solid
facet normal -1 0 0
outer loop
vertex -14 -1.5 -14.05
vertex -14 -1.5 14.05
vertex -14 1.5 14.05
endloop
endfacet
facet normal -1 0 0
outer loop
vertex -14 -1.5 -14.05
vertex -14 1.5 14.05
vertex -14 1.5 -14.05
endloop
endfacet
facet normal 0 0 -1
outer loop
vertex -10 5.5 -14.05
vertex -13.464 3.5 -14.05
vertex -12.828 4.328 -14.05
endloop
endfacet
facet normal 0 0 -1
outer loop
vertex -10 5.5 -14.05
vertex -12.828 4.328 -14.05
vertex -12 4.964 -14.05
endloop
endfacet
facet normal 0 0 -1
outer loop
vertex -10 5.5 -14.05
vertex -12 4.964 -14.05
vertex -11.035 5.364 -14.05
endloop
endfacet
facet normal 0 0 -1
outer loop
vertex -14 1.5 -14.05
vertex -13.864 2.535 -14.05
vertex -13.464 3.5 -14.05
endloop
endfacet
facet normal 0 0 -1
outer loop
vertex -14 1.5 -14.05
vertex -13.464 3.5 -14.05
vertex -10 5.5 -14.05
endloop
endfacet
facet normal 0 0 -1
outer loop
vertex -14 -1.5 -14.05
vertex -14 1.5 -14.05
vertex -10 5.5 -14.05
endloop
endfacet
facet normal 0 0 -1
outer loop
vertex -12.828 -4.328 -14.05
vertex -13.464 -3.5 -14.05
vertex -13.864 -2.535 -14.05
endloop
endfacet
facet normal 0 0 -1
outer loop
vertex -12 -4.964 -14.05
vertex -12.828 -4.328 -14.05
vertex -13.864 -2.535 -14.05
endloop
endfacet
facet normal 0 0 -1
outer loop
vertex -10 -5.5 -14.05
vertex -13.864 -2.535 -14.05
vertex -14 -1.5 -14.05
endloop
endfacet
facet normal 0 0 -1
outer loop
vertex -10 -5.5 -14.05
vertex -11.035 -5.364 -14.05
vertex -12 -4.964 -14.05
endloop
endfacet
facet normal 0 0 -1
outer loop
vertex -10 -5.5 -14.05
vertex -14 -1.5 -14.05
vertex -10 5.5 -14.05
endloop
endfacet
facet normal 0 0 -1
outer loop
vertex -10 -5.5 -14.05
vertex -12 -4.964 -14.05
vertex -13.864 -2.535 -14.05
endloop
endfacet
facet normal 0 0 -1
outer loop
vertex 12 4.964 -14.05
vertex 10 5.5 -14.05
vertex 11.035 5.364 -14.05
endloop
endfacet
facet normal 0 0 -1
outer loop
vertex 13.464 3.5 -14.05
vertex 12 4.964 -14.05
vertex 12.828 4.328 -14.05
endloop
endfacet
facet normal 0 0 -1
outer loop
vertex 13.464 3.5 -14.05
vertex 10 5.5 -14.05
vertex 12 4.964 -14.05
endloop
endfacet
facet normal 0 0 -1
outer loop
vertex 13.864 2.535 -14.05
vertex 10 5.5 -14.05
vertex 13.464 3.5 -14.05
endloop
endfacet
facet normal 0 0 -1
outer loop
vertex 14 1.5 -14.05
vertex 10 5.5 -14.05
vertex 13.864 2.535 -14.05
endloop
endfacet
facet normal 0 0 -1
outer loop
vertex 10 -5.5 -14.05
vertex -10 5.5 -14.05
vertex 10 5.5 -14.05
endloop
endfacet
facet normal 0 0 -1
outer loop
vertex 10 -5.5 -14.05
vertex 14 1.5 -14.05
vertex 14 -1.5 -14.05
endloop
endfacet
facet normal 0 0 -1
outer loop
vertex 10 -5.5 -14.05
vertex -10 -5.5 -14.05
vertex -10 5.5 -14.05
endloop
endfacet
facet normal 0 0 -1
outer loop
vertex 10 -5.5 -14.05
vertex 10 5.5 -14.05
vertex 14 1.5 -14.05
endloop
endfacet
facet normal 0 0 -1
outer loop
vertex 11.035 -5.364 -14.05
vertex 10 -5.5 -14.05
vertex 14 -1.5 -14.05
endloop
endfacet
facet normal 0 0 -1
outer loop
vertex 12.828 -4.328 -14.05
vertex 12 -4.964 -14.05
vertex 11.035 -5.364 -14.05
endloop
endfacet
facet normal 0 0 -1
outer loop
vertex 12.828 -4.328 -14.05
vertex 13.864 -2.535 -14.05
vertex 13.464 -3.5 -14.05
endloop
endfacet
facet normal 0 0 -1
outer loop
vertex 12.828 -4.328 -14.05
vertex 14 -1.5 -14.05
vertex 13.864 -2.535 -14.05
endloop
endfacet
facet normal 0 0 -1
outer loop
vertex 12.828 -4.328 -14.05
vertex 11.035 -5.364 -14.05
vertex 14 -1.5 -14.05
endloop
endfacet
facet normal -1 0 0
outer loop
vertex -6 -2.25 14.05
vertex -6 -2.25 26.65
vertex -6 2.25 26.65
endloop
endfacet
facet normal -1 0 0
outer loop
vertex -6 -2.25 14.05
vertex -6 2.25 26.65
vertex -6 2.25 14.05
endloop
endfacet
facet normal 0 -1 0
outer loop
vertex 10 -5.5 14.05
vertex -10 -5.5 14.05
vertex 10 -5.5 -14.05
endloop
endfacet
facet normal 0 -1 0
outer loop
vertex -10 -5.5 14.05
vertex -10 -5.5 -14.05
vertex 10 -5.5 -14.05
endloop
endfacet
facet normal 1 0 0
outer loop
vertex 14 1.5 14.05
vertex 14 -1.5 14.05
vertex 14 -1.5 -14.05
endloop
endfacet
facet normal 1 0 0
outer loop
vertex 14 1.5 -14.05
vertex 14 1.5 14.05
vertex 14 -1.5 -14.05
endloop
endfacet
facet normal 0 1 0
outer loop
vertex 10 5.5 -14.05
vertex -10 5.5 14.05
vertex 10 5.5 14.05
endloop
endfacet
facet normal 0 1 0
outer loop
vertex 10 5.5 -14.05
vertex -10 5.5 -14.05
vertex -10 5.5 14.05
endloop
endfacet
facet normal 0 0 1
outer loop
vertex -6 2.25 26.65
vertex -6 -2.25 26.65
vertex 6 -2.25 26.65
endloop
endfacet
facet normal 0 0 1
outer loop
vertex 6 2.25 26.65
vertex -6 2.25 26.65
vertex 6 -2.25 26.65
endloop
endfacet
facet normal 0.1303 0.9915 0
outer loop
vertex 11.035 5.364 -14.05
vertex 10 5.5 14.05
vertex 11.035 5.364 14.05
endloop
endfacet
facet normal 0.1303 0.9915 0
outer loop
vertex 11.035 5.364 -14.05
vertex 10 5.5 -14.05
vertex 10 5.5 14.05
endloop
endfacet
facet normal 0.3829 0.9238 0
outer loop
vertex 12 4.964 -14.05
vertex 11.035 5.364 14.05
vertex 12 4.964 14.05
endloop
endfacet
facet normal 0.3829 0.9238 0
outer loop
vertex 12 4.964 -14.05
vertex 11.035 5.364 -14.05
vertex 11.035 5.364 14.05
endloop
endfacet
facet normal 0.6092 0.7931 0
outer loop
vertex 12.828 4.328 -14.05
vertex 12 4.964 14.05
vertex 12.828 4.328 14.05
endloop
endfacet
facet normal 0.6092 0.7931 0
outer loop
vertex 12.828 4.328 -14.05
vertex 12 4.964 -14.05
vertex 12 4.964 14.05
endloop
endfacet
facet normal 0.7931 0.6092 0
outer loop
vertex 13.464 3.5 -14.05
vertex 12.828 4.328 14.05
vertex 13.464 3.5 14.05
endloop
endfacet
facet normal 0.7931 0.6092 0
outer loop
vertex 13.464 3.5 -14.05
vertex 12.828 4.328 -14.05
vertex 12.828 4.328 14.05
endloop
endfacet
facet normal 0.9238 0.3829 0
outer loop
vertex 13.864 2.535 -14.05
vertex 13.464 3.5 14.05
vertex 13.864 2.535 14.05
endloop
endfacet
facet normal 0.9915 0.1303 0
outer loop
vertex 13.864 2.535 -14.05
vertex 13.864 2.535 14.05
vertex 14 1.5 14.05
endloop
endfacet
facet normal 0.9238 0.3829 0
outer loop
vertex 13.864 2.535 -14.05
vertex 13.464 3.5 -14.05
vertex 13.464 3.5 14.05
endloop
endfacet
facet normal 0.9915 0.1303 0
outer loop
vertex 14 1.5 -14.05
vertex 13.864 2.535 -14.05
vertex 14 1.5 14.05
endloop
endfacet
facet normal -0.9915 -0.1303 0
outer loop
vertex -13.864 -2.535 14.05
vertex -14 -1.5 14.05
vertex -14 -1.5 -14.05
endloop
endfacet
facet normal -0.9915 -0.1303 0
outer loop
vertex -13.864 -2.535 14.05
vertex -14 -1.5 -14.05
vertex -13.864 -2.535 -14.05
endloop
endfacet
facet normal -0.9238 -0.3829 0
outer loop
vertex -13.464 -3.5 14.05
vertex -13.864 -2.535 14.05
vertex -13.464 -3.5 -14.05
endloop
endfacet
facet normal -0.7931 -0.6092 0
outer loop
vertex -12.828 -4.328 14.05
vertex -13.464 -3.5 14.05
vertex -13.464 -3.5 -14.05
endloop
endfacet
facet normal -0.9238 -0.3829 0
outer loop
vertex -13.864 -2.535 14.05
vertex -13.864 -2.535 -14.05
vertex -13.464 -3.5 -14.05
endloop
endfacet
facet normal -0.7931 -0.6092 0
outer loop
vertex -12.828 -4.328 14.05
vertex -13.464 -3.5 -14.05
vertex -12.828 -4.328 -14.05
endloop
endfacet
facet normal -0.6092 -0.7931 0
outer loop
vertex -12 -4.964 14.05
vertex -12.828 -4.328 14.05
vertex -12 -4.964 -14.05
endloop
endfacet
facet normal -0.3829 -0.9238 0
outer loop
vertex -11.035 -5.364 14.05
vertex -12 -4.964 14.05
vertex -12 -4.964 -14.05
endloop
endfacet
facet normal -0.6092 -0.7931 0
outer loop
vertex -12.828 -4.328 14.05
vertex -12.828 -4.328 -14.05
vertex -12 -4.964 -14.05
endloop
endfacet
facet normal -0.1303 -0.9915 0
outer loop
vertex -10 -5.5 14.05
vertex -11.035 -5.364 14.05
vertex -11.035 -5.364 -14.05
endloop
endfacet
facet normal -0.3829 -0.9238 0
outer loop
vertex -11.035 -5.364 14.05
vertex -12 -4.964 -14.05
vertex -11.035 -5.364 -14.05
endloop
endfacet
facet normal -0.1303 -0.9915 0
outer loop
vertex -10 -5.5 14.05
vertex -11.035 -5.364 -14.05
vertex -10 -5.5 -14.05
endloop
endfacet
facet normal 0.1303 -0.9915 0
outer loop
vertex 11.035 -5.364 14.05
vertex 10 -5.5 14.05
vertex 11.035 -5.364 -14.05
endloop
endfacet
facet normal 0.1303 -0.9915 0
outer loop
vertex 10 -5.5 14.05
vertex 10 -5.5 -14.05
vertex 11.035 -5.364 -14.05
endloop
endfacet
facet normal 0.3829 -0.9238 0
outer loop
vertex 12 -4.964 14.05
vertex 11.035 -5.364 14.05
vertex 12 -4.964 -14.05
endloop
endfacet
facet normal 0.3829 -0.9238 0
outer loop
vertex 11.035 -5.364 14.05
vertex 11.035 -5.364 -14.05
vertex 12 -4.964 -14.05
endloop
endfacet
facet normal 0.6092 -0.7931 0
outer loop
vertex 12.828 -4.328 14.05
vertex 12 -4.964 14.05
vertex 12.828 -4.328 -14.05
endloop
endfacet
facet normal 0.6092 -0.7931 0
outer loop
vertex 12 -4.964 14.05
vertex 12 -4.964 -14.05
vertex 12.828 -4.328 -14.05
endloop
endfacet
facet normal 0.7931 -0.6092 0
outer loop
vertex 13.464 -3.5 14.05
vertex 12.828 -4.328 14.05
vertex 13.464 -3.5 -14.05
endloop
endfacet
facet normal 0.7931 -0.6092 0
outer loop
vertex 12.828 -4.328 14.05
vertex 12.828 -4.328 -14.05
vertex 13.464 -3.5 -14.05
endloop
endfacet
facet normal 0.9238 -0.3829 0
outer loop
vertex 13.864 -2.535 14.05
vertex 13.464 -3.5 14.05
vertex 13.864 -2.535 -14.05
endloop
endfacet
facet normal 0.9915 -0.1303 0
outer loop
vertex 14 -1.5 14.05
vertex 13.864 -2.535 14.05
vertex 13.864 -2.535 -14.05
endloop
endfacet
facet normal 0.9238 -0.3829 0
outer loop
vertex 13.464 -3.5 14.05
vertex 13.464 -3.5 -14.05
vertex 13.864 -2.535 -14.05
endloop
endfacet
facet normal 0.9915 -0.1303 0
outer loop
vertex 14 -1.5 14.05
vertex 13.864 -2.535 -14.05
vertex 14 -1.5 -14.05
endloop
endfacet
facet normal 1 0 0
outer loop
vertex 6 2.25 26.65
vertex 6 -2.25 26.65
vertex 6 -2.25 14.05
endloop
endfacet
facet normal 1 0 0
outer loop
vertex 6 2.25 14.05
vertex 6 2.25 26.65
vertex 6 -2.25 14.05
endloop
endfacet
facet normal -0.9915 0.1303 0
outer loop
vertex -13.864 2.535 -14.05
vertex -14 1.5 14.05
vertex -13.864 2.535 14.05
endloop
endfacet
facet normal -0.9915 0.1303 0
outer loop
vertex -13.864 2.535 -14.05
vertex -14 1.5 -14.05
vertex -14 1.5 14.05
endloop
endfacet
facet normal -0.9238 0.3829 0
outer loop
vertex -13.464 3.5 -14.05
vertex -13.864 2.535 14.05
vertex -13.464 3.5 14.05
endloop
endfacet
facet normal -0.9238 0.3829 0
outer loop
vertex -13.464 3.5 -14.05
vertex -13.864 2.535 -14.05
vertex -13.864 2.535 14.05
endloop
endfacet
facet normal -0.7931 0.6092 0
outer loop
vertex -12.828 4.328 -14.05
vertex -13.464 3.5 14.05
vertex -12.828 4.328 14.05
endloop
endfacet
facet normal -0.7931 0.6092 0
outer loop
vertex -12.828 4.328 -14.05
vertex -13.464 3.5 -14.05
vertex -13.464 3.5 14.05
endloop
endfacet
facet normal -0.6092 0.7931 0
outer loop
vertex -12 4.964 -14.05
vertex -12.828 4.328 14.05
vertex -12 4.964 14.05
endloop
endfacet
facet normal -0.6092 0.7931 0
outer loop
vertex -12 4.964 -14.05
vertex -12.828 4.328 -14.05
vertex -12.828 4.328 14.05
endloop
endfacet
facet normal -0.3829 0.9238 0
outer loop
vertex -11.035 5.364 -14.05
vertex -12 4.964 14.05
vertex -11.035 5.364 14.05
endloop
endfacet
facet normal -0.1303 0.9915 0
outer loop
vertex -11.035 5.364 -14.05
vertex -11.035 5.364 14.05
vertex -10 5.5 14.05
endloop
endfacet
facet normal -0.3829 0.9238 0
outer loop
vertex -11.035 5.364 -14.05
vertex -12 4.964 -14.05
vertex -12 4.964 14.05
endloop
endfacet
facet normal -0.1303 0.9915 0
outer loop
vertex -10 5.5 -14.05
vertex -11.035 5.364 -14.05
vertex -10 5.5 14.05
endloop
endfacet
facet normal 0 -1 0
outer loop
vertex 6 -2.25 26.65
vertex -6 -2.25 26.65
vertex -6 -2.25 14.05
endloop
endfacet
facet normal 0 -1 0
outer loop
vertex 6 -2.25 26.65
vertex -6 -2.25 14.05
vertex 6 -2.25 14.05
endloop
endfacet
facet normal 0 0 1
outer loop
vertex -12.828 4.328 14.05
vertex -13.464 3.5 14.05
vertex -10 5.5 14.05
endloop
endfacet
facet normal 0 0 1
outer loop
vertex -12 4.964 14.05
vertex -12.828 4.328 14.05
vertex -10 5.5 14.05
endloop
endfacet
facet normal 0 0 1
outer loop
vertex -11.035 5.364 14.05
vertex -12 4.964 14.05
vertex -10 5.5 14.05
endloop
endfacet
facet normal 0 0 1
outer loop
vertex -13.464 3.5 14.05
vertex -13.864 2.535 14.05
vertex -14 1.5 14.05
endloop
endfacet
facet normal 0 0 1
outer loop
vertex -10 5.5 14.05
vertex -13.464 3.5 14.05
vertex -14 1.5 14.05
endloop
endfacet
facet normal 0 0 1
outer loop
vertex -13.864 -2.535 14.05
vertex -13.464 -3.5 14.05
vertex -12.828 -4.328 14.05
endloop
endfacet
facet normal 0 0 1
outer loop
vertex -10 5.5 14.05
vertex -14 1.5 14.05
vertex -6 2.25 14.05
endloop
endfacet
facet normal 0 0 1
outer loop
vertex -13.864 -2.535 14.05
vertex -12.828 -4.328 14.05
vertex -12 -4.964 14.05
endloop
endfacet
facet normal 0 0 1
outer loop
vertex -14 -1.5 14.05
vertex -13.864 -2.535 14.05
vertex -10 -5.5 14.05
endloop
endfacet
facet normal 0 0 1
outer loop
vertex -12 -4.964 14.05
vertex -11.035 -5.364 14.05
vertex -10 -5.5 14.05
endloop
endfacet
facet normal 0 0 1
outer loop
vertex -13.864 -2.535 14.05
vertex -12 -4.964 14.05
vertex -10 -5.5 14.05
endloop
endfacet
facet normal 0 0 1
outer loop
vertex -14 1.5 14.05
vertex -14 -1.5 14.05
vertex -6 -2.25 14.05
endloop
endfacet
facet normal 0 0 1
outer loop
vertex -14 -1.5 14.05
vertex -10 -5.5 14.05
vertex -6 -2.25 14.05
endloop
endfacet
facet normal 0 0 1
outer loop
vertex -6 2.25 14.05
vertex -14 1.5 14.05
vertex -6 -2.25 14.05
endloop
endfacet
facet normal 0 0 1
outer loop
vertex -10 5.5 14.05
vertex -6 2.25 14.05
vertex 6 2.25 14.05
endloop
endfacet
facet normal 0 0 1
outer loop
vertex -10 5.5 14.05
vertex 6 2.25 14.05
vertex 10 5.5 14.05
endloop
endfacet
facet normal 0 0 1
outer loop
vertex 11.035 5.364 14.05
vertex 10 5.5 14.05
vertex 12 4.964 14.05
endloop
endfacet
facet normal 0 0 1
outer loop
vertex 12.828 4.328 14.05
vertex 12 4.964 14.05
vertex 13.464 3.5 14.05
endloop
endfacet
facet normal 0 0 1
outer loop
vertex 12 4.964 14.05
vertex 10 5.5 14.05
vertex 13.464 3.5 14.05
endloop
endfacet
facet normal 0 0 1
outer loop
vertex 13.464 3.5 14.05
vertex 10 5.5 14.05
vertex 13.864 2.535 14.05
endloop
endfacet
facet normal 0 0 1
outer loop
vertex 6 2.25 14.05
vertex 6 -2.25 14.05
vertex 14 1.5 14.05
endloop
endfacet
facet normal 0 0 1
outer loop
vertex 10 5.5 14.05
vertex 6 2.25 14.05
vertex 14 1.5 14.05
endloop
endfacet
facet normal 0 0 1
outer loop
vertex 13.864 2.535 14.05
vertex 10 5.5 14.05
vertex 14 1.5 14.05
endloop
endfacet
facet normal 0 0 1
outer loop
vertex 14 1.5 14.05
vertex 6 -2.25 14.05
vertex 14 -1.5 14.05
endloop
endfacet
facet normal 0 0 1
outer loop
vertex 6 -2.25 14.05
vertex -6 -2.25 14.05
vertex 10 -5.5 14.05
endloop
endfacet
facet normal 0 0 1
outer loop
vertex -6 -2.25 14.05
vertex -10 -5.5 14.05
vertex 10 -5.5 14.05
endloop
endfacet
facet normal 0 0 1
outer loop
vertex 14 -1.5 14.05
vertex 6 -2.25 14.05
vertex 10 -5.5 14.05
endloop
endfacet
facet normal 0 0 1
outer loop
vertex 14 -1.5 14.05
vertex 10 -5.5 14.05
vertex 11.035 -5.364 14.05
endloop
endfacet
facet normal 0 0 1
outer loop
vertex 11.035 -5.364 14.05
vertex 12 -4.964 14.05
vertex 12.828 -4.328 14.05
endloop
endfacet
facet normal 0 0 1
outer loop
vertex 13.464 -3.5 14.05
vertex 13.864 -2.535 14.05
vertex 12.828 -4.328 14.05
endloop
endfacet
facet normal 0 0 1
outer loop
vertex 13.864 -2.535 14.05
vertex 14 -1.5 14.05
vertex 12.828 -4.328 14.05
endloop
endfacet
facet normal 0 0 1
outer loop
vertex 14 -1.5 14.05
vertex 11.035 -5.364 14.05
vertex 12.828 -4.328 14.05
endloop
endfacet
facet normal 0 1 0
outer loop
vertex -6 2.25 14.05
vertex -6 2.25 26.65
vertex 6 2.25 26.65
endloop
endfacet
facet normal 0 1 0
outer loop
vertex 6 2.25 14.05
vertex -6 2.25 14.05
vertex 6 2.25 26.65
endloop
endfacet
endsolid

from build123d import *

# Parameters (mm, degrees)
BOSS_EXTRUDE1_DEPTH      = 5.5
BOSS_EXTRUDE1_DEPTH_BACK = 5.5
BOSS_EXTRUDE2_DEPTH      = 2.25
BOSS_EXTRUDE2_DEPTH_BACK = 2.25
SKETCH1_4_W              = 12
SKETCH1_4_H              = 12.6
FILLET2_R                = 4


with BuildPart() as part:
    # Sketch1 → Boss-Extrude1 (new, two sides: drawn at the far end of the back side and taken through both)
    with BuildSketch(Plane(origin=(0, 0, 0), x_dir=(1, 0, 0), z_dir=(0, 1, 0)).offset(-BOSS_EXTRUDE1_DEPTH_BACK)):
        Polygon((14, 14.05), (-14, 14.05), (-14, -14.05), (-6, -14.05), (6, -14.05), (14, -14.05), align=None)
    extrude(amount=BOSS_EXTRUDE1_DEPTH + BOSS_EXTRUDE1_DEPTH_BACK)

    # Sketch1<4> → Boss-Extrude2 (add, two sides: drawn at the far end of the back side and taken through both)
    with BuildSketch(Plane(origin=(0, 0, 0), x_dir=(1, 0, 0), z_dir=(0, 1, 0)).offset(-BOSS_EXTRUDE2_DEPTH_BACK)):
        with Locations((0, -20.35)):
            Rectangle(SKETCH1_4_W, SKETCH1_4_H)
    extrude(amount=BOSS_EXTRUDE2_DEPTH + BOSS_EXTRUDE2_DEPTH_BACK)

    # Fillet2
    fillet2_edges = [part.edges().sort_by_distance(p)[0] for p in [
        (-14, -5.5, 0),
        (-14, 5.5, 0),
        (14, -5.5, 0),
        (14, 5.5, 0),
    ]]
    fillet(fillet2_edges, radius=FILLET2_R)


solid = part.part
